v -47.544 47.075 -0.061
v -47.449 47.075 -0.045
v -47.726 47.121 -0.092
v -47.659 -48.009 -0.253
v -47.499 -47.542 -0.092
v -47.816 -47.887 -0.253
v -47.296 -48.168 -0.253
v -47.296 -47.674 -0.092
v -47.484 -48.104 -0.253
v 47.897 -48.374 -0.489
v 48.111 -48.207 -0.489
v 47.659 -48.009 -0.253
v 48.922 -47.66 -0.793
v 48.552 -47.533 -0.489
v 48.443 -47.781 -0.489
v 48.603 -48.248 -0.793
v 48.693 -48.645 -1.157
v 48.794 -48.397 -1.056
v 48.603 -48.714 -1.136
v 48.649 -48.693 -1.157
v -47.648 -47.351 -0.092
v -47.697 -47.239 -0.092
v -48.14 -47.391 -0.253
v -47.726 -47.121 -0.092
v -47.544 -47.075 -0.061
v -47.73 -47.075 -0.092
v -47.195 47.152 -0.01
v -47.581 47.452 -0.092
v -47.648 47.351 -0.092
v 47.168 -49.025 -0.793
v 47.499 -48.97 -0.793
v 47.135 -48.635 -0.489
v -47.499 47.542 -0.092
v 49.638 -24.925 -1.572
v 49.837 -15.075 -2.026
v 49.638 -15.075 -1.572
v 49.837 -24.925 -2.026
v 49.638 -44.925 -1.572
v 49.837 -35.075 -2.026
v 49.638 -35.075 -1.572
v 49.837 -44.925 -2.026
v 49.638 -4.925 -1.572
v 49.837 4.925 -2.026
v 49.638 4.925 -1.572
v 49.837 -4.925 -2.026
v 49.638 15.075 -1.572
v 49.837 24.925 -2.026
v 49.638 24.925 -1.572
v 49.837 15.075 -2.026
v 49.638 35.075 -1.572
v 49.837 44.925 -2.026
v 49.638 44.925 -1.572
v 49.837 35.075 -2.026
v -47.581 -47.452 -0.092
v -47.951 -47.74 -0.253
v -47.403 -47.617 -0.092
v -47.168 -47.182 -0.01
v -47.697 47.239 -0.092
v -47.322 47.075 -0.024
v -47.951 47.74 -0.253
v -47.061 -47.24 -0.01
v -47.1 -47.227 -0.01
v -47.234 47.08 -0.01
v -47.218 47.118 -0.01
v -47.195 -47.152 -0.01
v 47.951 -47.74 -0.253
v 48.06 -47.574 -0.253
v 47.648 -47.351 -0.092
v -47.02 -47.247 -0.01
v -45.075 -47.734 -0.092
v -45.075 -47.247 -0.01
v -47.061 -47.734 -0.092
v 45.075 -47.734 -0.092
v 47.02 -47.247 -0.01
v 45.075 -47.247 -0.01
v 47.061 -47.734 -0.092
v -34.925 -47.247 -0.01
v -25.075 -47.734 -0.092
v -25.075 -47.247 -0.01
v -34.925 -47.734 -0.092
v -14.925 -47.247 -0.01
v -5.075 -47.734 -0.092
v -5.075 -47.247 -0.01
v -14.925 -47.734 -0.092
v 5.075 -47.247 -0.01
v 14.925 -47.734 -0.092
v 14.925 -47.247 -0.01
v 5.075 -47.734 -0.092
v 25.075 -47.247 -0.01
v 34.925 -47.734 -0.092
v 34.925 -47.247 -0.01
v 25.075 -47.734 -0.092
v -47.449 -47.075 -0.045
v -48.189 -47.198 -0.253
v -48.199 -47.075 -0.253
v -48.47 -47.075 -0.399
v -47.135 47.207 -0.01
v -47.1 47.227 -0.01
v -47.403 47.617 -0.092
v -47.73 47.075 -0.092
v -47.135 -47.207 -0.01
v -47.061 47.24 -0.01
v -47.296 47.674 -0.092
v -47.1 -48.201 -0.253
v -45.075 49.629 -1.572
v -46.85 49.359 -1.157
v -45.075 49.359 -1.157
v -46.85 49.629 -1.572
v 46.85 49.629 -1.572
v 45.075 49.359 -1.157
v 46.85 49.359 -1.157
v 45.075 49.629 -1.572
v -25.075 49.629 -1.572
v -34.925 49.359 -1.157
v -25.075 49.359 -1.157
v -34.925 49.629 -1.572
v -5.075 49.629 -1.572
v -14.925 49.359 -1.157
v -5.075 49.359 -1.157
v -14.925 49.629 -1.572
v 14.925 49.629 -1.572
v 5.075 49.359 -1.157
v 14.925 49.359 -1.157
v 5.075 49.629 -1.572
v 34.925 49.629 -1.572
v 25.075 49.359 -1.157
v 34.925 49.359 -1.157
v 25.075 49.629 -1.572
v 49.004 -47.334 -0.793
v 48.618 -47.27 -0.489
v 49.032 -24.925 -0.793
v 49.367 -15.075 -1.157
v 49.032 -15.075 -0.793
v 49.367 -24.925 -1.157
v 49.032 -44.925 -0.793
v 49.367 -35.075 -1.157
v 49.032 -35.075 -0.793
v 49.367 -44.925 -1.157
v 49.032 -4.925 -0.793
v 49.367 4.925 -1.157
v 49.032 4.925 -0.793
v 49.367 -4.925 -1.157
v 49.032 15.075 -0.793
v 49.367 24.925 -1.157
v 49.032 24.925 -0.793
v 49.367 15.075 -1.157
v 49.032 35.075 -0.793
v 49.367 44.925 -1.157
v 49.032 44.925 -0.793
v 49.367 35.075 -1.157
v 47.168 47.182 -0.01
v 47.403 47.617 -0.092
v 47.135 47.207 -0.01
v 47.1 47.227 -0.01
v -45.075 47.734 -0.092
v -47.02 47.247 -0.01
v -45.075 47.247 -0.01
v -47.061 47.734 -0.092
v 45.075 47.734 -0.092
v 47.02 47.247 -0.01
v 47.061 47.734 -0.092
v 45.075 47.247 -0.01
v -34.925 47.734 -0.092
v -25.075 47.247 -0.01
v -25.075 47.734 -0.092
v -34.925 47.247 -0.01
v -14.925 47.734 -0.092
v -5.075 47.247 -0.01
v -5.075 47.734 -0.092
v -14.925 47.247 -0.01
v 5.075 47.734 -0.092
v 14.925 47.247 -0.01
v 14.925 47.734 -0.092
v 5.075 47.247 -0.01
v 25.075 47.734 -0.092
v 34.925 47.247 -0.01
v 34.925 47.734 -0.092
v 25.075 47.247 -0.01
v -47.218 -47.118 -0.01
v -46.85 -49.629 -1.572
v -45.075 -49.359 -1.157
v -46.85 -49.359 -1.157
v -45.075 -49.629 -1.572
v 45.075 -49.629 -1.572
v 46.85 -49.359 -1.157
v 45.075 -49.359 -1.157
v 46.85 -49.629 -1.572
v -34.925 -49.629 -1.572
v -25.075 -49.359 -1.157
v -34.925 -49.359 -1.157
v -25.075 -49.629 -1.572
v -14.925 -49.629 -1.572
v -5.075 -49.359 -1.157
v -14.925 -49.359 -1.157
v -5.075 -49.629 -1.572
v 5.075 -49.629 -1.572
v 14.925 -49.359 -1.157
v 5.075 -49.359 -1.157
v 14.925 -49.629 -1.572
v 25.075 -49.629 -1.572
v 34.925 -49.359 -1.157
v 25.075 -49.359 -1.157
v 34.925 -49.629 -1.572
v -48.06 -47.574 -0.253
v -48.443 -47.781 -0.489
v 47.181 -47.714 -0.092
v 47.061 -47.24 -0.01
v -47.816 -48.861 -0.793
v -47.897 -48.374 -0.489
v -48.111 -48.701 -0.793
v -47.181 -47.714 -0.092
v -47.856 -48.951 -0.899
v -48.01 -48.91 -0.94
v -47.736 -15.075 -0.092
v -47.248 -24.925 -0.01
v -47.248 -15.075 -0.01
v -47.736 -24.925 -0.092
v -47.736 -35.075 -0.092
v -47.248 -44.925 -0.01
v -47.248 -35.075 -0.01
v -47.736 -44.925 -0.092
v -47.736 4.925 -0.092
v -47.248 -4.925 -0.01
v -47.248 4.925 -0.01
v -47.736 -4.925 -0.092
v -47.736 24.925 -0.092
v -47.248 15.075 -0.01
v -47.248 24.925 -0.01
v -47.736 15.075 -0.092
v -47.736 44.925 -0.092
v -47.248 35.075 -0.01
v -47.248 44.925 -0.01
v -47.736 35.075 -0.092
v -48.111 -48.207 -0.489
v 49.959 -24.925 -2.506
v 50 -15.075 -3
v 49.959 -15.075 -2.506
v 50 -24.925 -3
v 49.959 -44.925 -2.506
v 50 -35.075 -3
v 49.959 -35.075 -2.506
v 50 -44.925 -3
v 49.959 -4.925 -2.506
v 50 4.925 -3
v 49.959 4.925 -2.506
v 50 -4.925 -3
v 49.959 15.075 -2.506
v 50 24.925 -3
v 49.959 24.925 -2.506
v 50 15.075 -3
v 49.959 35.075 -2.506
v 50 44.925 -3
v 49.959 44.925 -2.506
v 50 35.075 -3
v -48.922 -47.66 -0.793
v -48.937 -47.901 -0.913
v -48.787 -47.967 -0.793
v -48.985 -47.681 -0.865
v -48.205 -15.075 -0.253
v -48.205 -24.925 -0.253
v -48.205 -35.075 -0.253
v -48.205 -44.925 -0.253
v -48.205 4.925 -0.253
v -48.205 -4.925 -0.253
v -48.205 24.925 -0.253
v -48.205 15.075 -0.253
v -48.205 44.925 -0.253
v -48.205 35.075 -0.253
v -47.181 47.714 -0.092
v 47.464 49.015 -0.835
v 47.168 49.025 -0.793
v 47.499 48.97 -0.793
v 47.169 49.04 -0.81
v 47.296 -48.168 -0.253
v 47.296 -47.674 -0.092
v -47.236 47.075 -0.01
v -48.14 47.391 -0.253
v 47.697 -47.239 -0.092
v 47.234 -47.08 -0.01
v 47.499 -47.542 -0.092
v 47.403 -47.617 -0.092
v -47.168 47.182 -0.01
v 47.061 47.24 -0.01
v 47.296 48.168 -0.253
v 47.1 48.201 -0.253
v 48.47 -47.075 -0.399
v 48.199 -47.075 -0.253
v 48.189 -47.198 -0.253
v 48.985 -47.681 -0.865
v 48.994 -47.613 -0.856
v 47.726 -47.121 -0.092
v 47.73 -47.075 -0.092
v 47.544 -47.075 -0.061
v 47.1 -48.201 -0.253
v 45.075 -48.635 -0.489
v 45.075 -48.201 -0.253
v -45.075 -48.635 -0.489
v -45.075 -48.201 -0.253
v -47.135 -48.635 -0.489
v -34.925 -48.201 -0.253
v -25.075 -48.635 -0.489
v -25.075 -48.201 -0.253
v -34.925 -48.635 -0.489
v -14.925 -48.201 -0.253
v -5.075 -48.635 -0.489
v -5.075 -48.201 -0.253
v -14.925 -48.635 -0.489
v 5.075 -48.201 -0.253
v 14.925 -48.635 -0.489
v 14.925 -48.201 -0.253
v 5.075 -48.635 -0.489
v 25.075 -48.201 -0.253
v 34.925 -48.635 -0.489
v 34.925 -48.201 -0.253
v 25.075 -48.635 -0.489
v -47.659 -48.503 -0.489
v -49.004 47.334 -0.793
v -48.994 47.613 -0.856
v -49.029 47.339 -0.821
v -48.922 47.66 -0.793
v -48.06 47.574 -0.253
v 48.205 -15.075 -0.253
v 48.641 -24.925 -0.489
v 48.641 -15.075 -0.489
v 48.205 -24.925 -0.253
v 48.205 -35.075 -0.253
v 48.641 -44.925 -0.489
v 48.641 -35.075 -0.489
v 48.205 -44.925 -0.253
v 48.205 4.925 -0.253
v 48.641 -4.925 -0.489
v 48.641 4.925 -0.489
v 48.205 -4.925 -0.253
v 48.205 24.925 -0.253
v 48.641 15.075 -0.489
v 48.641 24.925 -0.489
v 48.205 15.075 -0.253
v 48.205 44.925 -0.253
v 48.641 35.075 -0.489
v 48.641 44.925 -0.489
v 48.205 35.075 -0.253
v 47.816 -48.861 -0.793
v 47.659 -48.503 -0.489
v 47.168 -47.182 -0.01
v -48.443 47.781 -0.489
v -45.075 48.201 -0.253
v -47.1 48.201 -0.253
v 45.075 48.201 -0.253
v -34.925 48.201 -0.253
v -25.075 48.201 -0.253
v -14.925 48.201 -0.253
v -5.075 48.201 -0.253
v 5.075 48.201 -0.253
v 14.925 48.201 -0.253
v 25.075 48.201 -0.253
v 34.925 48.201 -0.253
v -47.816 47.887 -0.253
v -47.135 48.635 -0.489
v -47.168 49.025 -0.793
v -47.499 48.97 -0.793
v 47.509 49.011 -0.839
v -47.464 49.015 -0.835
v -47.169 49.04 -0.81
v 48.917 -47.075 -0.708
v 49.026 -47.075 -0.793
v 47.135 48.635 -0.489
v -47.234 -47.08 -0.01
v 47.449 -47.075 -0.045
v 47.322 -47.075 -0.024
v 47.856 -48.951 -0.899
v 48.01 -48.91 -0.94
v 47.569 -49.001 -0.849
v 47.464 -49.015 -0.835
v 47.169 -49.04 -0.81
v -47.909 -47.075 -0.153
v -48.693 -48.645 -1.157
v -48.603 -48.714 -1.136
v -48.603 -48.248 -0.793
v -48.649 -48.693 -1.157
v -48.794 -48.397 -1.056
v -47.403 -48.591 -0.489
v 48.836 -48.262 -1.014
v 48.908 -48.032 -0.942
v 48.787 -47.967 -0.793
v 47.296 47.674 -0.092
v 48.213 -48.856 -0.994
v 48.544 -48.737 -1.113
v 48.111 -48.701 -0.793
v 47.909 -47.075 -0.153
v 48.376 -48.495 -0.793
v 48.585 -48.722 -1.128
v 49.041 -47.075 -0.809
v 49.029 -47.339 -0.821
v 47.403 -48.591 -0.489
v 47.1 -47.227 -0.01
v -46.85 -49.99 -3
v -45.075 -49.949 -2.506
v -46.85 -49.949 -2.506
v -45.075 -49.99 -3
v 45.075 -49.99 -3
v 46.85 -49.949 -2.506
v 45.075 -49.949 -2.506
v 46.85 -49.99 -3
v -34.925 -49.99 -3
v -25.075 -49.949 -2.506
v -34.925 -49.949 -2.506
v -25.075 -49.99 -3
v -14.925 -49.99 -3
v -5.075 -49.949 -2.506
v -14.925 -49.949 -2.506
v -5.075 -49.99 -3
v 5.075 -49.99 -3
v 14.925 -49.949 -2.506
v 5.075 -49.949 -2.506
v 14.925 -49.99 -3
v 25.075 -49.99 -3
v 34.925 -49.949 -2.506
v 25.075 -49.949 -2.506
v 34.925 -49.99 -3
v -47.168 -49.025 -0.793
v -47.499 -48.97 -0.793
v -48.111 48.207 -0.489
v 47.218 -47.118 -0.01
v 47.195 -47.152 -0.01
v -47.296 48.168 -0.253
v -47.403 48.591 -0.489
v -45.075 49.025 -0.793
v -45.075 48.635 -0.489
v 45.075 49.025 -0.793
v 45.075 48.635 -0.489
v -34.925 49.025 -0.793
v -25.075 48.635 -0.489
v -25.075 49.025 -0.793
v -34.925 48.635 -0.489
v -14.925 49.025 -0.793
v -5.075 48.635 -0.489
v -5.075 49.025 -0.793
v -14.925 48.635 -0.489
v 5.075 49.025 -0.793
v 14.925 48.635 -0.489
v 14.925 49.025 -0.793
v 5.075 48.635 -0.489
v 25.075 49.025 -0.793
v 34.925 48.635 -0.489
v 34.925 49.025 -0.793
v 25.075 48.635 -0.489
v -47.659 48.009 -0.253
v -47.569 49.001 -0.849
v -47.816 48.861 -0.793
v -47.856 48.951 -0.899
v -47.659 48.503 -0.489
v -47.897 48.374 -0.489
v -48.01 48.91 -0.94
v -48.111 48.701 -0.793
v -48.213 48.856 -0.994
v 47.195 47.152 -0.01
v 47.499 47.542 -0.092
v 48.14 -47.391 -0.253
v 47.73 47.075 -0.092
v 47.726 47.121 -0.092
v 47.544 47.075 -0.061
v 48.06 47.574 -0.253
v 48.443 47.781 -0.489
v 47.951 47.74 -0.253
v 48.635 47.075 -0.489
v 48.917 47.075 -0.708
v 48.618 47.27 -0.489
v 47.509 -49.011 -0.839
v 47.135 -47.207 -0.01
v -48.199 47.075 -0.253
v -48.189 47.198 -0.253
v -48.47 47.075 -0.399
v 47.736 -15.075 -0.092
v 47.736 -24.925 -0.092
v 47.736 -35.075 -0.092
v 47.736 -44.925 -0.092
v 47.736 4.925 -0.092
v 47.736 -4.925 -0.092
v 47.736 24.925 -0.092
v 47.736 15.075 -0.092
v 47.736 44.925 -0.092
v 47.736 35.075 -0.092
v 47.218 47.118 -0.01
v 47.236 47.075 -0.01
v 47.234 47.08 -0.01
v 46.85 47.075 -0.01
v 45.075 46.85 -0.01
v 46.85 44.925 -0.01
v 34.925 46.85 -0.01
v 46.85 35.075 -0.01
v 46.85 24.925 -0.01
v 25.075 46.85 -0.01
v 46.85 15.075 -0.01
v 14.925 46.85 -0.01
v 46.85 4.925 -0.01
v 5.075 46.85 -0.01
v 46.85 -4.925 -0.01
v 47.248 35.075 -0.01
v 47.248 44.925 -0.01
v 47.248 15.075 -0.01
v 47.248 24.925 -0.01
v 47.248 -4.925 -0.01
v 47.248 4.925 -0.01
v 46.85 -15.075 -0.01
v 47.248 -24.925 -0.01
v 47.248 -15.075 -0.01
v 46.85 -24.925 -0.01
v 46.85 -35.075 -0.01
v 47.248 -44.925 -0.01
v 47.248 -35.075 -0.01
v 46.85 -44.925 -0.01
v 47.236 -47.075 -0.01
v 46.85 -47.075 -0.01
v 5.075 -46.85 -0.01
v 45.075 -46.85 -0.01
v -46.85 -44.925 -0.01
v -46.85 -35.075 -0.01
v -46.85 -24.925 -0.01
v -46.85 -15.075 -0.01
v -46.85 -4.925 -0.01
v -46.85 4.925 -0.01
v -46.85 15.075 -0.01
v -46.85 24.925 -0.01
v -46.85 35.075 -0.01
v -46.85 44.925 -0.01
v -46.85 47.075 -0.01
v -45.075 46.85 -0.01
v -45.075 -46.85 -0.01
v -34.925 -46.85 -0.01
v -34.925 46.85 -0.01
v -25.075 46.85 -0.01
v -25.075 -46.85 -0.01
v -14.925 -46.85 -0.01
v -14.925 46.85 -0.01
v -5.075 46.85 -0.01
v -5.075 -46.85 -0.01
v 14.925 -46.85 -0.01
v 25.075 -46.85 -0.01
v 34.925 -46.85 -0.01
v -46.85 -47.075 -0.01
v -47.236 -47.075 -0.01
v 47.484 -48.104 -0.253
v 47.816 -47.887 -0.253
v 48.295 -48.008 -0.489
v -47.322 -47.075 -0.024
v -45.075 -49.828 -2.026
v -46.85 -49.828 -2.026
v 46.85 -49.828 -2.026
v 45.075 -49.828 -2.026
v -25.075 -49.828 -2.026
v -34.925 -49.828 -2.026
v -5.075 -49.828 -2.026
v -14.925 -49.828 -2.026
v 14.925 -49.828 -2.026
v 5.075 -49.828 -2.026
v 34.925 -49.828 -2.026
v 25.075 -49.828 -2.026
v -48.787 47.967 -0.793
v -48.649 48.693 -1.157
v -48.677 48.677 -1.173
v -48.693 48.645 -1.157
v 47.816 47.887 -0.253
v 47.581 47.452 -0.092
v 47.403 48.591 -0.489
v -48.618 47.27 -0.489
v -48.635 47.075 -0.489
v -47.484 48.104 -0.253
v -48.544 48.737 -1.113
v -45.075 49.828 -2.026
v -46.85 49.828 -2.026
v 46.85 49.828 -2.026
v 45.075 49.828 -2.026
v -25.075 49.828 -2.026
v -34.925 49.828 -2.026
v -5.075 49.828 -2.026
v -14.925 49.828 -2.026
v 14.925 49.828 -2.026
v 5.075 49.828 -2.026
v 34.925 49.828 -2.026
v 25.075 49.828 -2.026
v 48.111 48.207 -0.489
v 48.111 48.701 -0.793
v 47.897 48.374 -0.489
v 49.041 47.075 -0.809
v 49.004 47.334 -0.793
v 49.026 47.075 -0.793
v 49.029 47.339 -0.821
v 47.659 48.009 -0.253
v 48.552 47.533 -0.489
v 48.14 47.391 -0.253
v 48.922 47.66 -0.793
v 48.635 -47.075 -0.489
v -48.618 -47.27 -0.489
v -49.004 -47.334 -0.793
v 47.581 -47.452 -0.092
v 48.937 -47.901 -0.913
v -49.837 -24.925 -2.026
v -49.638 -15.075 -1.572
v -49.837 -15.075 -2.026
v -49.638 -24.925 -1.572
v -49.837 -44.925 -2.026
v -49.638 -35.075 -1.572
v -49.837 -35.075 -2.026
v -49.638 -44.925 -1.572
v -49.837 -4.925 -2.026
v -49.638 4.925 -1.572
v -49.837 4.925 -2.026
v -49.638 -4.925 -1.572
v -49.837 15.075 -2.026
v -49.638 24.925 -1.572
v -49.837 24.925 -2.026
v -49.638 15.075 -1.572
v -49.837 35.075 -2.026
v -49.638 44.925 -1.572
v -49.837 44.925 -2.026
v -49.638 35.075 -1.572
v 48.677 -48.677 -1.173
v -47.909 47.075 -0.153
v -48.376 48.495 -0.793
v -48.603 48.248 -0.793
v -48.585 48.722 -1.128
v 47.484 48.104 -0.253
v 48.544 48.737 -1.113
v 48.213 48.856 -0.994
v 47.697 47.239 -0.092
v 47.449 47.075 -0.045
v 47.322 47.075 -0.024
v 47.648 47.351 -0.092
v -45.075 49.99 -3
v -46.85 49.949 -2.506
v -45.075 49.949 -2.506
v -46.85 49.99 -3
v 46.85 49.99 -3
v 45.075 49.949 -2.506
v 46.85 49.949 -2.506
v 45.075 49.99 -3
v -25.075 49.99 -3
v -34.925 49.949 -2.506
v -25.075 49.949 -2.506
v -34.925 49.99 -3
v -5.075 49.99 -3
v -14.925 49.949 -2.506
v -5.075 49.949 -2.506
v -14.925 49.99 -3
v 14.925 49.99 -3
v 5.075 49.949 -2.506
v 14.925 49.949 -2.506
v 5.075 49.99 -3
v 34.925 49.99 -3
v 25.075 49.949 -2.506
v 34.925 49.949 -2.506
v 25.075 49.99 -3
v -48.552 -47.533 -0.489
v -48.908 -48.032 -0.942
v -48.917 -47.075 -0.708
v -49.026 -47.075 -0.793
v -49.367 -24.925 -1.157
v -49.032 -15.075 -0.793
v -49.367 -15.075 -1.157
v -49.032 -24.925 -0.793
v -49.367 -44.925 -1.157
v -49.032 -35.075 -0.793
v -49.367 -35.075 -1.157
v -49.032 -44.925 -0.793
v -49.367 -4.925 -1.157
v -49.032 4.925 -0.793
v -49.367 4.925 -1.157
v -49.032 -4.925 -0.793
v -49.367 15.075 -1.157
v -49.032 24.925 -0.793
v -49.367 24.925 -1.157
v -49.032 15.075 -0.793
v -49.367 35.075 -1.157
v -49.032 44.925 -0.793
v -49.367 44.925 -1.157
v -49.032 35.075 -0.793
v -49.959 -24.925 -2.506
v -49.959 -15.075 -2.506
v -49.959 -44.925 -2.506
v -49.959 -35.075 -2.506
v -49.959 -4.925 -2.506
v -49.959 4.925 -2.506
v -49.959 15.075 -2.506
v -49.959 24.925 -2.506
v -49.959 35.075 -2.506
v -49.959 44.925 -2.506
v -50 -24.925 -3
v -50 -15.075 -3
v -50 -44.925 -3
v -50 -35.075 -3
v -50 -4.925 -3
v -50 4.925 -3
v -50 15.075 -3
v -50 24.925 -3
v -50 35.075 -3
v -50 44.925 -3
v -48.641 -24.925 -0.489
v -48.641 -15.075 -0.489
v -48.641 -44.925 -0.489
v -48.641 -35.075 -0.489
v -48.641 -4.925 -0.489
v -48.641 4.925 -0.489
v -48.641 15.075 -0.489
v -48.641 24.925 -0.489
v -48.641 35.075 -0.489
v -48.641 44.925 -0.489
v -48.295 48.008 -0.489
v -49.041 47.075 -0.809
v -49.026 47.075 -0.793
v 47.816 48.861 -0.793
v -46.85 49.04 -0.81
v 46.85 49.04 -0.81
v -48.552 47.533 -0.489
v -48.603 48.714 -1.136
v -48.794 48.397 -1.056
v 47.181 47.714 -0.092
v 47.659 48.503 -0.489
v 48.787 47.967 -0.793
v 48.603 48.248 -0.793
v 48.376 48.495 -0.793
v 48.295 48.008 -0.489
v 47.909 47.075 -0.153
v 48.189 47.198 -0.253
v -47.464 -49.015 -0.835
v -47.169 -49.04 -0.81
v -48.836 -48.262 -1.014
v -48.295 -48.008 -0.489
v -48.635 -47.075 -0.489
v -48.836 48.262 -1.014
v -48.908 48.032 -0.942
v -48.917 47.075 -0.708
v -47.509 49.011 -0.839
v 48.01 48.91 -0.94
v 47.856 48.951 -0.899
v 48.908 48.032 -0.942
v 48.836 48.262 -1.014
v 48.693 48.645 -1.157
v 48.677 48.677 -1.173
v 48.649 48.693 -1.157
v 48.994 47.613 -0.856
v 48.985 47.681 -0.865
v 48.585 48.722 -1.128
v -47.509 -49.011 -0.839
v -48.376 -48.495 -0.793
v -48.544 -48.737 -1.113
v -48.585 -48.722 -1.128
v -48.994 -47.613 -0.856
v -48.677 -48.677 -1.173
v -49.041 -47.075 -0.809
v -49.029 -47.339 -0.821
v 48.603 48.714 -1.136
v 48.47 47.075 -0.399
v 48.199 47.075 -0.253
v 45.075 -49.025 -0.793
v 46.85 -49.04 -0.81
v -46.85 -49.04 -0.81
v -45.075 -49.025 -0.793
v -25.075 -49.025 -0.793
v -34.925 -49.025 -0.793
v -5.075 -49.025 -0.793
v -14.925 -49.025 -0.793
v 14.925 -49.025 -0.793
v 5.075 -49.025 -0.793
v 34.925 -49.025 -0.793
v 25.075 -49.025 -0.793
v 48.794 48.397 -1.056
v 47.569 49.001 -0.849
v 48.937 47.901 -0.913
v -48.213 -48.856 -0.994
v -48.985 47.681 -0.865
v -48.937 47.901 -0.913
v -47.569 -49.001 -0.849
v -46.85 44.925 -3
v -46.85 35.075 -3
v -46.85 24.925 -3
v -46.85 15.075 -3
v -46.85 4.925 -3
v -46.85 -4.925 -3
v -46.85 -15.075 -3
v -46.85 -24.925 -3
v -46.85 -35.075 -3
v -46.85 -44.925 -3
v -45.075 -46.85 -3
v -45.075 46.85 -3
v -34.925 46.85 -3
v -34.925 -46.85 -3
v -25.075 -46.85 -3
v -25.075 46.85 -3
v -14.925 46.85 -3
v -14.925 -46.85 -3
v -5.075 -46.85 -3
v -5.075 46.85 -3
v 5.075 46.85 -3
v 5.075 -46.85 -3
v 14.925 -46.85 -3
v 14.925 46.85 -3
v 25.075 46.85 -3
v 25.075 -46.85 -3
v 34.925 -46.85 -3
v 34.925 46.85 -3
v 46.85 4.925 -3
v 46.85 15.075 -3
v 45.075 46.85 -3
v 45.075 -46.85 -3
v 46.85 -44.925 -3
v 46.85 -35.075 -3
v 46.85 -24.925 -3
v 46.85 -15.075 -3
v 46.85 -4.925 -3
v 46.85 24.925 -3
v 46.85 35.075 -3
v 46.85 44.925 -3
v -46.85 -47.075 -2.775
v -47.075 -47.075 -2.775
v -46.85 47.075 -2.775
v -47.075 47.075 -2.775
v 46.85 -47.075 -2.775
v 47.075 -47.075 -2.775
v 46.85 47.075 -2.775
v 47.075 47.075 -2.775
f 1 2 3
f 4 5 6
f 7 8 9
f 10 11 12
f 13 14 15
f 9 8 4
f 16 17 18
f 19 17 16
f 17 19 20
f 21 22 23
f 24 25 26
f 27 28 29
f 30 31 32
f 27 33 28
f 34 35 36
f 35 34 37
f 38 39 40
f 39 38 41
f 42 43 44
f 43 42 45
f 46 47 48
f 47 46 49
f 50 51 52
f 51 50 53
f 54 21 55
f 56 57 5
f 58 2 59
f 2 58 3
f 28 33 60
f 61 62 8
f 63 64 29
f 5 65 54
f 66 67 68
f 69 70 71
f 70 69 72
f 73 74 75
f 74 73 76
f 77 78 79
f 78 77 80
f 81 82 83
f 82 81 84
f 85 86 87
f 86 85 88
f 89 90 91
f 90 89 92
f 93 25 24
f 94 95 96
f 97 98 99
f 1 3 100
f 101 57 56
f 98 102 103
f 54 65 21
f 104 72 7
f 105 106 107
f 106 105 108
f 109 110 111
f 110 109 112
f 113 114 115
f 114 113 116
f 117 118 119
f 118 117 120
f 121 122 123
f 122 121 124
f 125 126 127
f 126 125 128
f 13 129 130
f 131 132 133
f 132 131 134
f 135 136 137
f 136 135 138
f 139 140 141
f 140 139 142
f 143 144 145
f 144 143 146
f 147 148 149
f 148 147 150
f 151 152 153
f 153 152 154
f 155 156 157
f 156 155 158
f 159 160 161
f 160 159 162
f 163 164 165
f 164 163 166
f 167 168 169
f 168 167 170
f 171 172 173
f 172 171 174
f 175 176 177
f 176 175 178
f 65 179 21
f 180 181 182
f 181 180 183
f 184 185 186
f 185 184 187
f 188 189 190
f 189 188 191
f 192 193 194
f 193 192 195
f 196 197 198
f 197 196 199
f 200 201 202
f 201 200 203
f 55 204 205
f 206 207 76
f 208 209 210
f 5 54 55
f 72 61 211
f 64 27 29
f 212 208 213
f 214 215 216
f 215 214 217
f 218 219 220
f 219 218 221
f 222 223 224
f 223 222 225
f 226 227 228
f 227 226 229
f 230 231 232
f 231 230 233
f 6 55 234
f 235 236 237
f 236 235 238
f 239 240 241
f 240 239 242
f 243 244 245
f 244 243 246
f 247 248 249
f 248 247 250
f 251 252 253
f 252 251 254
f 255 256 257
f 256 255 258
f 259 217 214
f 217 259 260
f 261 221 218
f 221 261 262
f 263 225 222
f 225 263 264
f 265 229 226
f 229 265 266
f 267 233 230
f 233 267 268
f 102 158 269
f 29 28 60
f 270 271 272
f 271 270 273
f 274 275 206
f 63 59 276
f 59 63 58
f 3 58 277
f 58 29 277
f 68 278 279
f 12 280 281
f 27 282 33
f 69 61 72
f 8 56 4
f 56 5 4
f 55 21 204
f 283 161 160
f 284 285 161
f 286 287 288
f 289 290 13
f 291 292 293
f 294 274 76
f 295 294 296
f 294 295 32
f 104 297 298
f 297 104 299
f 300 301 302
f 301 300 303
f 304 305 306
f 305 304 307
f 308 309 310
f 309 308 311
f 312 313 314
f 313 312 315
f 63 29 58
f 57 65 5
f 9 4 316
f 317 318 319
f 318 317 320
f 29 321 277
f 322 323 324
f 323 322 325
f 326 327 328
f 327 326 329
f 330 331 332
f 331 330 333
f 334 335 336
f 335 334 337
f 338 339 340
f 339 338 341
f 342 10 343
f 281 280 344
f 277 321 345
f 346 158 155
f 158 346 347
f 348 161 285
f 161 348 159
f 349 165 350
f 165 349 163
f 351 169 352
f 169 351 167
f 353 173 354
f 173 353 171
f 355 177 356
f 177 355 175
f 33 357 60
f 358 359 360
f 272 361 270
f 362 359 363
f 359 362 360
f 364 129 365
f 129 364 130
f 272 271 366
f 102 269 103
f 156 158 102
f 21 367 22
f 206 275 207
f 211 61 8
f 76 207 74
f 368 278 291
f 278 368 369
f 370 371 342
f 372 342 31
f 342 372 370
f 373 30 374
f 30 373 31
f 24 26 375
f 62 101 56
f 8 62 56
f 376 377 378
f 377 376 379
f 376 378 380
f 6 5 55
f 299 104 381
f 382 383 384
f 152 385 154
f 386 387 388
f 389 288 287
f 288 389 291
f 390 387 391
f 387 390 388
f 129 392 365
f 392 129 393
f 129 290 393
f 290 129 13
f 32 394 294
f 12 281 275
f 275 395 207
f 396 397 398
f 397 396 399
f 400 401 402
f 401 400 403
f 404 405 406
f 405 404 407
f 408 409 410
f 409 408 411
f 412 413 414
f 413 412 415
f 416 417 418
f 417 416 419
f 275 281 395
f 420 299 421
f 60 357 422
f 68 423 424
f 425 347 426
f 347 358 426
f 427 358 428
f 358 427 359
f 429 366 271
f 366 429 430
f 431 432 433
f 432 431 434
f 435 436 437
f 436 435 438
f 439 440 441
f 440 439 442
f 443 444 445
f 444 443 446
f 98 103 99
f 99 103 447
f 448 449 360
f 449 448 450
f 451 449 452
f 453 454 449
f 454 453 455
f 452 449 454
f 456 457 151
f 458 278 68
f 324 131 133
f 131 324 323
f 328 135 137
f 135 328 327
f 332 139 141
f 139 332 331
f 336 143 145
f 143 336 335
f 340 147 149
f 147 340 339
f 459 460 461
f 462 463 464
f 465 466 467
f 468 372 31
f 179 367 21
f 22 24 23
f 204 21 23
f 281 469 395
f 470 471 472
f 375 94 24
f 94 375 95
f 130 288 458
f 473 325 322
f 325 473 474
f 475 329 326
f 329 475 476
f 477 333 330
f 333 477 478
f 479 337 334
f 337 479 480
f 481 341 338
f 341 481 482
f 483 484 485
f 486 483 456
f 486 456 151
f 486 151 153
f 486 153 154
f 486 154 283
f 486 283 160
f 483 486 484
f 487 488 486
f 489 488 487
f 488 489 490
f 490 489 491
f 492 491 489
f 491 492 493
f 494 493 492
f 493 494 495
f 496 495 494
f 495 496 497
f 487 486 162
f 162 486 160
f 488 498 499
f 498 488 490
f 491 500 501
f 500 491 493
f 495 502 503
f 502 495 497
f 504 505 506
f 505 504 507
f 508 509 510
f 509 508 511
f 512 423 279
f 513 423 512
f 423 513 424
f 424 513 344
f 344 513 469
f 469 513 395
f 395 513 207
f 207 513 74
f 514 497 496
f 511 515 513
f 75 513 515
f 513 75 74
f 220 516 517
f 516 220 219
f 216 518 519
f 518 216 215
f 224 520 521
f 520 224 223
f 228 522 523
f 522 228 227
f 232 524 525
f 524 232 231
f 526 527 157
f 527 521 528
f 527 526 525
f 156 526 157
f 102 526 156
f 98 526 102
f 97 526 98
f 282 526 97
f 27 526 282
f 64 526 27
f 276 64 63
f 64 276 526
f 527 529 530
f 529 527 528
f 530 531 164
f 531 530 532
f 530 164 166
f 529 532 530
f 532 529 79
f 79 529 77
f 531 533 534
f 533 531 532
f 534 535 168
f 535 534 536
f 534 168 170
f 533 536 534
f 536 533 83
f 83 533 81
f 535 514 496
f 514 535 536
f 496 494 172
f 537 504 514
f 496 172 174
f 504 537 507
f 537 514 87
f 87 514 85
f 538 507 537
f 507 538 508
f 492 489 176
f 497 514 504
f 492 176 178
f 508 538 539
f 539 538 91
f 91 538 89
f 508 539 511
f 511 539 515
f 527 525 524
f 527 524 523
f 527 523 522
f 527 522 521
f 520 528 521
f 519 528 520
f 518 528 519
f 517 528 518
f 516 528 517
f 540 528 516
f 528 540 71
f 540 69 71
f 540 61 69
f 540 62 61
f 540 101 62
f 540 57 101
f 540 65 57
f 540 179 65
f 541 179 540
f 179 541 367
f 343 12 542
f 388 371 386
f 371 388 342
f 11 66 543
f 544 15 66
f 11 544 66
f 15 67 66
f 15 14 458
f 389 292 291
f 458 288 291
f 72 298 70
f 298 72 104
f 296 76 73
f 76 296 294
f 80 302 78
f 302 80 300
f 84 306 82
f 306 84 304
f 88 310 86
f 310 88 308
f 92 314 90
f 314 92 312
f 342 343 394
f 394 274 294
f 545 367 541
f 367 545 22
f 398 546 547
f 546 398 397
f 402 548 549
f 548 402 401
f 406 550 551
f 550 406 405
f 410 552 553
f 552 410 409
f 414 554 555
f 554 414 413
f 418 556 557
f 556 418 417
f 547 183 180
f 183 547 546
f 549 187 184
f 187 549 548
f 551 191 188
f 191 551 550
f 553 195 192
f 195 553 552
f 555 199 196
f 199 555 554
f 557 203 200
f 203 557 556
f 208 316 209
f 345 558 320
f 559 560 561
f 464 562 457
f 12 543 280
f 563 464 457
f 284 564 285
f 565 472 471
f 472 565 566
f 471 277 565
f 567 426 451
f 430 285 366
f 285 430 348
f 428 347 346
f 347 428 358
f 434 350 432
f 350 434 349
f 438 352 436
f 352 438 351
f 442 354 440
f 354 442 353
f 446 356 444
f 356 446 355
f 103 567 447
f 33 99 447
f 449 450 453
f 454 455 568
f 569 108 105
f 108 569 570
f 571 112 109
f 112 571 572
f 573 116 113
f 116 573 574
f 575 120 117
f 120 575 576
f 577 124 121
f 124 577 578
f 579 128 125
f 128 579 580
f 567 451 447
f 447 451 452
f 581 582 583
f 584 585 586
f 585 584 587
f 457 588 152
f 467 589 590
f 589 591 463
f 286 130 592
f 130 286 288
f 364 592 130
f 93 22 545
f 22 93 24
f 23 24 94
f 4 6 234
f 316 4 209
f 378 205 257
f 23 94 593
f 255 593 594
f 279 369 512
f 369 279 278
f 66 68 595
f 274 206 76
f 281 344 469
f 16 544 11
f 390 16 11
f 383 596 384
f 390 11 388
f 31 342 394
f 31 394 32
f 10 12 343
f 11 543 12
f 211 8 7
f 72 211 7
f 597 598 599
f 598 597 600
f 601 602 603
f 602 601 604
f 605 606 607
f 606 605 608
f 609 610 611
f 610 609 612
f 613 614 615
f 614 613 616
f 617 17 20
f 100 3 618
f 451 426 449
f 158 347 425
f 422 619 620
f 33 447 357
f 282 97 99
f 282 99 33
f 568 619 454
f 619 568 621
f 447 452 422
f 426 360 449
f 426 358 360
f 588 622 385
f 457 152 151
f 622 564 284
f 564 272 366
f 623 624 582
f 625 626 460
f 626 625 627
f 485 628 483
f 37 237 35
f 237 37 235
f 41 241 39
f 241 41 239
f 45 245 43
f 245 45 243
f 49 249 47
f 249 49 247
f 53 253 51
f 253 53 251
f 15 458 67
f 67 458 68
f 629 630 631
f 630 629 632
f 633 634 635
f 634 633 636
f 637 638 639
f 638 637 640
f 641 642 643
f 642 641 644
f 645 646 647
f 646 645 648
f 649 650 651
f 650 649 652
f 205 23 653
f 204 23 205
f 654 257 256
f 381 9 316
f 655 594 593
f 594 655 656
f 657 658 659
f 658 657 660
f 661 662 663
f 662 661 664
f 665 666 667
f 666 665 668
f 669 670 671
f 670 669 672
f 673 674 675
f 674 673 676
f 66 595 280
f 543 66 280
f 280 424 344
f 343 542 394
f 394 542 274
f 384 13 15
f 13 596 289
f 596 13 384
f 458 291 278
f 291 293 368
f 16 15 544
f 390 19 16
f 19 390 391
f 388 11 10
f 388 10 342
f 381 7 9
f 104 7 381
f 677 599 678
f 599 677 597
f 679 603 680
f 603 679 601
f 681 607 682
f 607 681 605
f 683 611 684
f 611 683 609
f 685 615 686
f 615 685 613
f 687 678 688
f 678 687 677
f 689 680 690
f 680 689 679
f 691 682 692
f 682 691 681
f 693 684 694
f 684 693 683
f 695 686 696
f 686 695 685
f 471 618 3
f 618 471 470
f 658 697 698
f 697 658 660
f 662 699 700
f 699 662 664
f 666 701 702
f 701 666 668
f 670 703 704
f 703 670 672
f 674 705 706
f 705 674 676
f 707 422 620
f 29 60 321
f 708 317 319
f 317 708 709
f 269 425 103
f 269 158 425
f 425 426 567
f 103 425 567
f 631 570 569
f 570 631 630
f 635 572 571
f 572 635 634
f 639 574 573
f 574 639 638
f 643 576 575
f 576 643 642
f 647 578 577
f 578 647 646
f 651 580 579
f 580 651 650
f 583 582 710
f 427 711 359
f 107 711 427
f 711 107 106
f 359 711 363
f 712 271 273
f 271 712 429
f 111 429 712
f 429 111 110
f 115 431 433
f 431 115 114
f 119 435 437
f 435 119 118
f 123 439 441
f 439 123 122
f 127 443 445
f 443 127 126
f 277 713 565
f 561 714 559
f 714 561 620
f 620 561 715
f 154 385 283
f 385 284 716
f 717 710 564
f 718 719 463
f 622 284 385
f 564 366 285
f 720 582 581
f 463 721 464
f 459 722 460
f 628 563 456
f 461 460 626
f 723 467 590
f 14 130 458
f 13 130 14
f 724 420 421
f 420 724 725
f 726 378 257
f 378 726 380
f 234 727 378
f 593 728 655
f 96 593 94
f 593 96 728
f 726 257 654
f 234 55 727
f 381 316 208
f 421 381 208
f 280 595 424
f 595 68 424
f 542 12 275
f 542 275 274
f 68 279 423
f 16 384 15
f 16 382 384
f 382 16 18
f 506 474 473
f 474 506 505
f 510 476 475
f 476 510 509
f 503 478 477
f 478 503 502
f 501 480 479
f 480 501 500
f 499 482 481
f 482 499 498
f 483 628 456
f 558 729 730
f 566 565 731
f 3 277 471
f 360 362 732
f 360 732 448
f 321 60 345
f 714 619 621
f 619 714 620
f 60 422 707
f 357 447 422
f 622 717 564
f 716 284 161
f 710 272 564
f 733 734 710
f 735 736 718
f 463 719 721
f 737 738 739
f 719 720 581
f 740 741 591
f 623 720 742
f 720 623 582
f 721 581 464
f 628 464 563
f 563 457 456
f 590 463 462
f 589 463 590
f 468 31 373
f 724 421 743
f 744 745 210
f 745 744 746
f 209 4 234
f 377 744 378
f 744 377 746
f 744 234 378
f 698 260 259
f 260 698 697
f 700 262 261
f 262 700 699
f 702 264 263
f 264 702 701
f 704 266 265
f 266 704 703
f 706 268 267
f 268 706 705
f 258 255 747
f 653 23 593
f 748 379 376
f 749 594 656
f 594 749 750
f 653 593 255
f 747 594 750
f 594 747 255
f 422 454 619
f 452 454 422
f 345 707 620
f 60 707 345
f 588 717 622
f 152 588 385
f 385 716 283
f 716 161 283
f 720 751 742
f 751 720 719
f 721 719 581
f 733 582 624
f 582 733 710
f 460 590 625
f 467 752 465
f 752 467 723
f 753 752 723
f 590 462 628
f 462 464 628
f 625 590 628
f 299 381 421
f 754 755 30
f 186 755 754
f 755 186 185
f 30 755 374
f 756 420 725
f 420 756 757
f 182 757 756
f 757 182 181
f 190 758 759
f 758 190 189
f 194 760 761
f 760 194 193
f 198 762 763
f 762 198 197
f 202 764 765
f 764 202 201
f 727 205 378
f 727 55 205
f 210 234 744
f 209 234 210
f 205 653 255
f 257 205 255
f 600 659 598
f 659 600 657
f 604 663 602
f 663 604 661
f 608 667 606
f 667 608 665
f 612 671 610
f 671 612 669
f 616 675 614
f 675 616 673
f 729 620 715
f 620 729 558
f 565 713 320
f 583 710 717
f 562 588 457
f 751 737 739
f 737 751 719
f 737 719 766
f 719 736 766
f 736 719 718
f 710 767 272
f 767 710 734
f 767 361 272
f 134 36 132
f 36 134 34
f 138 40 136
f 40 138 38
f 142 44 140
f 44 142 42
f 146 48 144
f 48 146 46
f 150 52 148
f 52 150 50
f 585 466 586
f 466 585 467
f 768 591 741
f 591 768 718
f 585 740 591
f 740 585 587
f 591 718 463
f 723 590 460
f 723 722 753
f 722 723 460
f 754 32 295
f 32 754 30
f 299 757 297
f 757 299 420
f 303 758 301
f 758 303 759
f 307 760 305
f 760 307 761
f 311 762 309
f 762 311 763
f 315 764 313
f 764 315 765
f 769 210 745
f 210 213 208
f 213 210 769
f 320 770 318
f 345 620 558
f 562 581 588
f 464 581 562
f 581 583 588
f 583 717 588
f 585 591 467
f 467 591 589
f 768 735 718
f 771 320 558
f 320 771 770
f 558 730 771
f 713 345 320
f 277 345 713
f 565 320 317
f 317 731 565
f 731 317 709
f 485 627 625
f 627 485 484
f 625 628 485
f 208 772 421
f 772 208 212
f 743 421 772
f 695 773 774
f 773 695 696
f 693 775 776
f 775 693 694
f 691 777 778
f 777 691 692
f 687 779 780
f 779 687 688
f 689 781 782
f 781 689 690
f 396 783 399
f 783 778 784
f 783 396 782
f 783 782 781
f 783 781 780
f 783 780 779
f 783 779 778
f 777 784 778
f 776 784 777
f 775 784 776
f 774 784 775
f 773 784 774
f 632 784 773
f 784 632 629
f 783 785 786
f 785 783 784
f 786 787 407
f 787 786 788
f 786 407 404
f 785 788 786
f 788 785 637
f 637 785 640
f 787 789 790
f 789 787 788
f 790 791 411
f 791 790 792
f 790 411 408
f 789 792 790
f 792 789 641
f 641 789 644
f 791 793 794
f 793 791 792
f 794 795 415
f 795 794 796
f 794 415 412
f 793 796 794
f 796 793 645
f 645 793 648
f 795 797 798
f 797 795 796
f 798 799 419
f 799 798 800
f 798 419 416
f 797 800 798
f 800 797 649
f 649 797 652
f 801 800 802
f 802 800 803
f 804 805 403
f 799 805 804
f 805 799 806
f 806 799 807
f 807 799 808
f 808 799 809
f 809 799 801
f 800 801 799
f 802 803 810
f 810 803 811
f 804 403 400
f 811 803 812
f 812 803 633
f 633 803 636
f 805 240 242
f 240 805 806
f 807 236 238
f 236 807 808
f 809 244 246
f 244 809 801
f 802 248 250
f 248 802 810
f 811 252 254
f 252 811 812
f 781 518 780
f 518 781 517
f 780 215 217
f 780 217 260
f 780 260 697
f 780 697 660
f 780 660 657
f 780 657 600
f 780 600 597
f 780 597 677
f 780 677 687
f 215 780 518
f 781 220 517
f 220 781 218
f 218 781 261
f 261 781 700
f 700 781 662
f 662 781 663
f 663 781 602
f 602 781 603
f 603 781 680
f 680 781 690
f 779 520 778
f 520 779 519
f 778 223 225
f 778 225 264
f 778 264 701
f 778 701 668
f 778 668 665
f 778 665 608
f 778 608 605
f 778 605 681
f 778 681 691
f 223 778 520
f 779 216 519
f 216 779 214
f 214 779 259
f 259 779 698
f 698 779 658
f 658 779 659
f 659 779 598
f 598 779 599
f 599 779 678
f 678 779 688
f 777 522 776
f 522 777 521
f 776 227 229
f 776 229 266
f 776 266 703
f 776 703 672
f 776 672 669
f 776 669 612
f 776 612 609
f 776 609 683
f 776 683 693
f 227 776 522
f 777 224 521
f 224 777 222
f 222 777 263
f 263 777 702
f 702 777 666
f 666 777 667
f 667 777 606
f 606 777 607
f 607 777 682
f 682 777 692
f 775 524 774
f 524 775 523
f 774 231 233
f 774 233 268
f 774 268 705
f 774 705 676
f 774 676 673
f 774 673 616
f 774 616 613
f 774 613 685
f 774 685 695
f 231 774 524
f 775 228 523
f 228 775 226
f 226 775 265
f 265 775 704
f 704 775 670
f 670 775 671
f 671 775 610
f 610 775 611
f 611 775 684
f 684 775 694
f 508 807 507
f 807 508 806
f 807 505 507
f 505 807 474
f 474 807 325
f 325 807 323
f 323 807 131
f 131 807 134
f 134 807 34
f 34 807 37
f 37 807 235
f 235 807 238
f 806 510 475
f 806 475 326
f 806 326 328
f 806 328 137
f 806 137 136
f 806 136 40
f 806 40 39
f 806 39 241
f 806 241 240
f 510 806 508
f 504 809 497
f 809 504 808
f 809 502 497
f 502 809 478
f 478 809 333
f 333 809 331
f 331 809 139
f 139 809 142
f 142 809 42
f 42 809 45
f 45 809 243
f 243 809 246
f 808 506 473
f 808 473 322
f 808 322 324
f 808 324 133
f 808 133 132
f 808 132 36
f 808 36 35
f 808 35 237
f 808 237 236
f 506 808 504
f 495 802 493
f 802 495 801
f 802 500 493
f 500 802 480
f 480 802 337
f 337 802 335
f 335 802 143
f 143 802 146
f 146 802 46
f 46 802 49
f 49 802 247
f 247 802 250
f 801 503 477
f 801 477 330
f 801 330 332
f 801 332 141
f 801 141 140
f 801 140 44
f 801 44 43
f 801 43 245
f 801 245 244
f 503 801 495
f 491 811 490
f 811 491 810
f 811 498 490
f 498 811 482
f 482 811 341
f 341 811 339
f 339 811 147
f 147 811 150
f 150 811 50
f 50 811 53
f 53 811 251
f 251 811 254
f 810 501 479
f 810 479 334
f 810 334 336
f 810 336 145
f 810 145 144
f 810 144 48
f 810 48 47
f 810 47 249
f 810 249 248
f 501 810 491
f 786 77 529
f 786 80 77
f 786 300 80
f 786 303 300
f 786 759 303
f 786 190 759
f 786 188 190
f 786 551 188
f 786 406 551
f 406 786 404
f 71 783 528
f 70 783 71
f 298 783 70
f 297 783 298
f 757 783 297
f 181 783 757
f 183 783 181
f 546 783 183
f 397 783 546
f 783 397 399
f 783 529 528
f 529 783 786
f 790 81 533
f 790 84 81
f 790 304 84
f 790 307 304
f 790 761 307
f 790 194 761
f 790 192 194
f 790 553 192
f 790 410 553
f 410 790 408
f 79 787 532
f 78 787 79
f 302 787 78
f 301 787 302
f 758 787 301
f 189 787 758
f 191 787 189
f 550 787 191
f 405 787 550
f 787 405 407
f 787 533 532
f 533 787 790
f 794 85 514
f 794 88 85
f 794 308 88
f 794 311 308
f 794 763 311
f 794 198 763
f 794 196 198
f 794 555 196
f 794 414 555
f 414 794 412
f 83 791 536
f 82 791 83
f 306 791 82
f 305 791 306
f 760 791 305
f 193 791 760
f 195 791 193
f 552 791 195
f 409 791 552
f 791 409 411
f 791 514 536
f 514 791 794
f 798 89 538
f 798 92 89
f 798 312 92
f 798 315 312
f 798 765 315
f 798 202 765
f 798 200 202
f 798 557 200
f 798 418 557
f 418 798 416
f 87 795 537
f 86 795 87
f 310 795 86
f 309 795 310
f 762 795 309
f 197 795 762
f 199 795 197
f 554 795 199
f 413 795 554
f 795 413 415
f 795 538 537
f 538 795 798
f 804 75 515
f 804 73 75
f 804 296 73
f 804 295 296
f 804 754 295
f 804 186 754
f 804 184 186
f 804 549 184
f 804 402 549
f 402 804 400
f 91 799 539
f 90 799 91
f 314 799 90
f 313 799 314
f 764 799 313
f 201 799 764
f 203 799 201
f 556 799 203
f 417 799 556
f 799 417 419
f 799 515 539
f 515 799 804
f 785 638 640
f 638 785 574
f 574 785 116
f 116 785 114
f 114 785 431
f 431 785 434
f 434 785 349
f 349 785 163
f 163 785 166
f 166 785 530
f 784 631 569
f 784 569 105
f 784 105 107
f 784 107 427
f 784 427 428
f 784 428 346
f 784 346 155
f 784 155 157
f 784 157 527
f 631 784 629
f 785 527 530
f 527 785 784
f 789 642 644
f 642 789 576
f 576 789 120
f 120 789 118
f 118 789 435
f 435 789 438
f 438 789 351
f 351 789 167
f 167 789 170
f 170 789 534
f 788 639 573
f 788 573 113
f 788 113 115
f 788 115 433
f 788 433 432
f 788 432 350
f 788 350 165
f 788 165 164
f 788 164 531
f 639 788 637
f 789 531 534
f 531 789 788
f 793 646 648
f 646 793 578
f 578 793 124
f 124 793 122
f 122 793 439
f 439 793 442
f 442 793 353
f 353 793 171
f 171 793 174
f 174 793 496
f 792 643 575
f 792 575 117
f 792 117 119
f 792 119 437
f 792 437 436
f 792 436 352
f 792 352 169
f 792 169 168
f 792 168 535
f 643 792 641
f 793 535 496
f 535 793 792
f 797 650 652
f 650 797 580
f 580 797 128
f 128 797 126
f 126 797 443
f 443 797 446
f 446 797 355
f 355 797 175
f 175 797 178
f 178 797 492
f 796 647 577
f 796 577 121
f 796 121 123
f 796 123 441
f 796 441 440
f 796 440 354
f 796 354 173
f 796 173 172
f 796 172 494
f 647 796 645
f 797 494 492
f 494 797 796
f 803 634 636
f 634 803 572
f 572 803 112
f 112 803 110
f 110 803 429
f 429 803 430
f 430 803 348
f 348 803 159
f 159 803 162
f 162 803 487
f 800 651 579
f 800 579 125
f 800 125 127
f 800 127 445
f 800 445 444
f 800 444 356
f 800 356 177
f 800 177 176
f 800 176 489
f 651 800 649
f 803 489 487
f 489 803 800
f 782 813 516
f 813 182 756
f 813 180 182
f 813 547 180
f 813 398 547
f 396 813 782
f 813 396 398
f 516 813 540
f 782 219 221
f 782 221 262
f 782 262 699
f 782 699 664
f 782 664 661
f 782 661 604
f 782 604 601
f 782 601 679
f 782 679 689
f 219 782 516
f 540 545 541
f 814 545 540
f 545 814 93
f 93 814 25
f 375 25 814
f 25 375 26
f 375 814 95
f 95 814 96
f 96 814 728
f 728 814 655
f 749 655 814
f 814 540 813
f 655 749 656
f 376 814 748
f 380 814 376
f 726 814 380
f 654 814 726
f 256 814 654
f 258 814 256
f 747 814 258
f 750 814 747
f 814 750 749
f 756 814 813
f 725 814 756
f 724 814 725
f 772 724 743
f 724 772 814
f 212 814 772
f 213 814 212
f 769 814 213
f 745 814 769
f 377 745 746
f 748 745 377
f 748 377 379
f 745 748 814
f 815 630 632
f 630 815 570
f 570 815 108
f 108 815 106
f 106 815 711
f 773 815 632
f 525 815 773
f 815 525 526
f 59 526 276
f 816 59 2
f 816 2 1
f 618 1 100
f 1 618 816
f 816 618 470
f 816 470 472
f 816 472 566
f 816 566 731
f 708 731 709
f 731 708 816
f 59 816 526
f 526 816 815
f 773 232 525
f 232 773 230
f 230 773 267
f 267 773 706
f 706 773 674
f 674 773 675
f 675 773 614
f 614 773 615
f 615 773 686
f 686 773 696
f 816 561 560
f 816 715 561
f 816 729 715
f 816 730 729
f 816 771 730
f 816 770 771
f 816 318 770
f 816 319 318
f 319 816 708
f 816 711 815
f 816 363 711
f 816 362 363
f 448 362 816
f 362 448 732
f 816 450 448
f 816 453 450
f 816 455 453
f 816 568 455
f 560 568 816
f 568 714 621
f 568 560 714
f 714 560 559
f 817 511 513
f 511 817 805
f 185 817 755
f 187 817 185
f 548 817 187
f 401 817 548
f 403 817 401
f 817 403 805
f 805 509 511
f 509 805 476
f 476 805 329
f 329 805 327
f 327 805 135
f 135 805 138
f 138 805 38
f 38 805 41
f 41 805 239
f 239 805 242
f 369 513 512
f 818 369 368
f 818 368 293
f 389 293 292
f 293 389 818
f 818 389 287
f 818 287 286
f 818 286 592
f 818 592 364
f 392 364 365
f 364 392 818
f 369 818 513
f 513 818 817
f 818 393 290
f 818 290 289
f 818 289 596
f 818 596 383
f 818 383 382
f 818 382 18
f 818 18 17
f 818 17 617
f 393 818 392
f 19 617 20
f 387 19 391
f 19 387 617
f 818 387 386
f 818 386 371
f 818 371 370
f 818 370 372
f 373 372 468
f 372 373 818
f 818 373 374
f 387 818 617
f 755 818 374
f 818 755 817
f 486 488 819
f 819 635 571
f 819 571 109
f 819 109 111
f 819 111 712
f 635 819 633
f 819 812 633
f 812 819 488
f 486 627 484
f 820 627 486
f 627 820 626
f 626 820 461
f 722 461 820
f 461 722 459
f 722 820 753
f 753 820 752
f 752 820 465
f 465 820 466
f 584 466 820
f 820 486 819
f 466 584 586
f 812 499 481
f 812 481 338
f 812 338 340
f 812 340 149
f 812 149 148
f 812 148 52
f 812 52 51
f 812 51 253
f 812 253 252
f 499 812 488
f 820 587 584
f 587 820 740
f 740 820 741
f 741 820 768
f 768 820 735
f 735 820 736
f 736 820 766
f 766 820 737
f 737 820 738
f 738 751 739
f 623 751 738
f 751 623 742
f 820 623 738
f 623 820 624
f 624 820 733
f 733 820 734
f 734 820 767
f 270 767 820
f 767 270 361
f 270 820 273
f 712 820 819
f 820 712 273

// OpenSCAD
// https://akizukidenshi.com/catalog/g/gP-17641/
$fa=6;
$fs=.5;
g=.15;
// use <../Zen Maru Gothic.ttf>
module rcube(w=[10,10,10],r=1){translate([r,r,r])minkowski(){cube([w[0]-r-r,w[1]-r-r,w[2]-r-r]);sphere(r);}}

module panel(){
	translate([-50,-50,-3]){
	difference(){
		scale([1,1,-1])translate([0,0,-3])intersection(){
		rcube([100,100,10],3);
		cube([100,100,3]);
		}
		for(i=[1:4])translate([0,(i)/5*100,0])cube([6+g+g,10+g,10],center=true);
			translate([0,4,0])cube([6+g+g,2+g,10],center=true);
				translate([3+g,0,0])rotate([0,-135,0])cube(3+g);
				translate([0,3+g,0])rotate([135,0,0])cube(3+g);
			translate([0,100-4,0])cube([6+g+g,2+g,10],center=true);
				translate([3+g,100,0])rotate([0,45,180])cube(3+g);
				translate([0,100-3-g,0])rotate([-45,0,0])cube(3+g);

		for(i=[1:4])translate([100,(i)/5*100,0])cube([6+g+g,10+g,10],center=true);
			translate([100,4,0])cube([6+g+g,2+g,10],center=true);
				translate([100-3-g,0,0])rotate([0,45,0])cube(3+g);
				translate([100,3+g,0])rotate([-45,0,180])cube(3+g);
			translate([100,100-4,0])cube([6+g+g,2+g,10],center=true);
				translate([100-3-g,100,0])rotate([0,-135,180])cube(3+g);
				translate([100,100-3-g,0])rotate([135,0,180])cube(3+g);

		for(i=[0:4])translate([(i+.5)/5*100,0,0])cube([10+g,6+g+g,10],center=true);
		for(i=[0:4])translate([(i+.5)/5*100,100,0])cube([10+g,6+g+g,10],center=true);
	}
}
}

module assembled(){
	rotate([0,0,0]){translate([0,0,-50])rotate([180,0,0])panel();translate([0,0,50])panel();}
	rotate([90,90,0]){translate([0,0,-50])rotate([180,0,0])panel();translate([0,0,50])panel();}
	rotate([90,0,90]){translate([0,0,-50])rotate([180,0,0])panel();translate([0,0,50])panel();}
}

module stack(){for(i=[0:5])translate([0,0,3.2*i])panel();}

panel();


/*
translate([105,125,0]){
	linear_extrude(3)text(text="あ",font="Zen Maru Gothic");
}*/
